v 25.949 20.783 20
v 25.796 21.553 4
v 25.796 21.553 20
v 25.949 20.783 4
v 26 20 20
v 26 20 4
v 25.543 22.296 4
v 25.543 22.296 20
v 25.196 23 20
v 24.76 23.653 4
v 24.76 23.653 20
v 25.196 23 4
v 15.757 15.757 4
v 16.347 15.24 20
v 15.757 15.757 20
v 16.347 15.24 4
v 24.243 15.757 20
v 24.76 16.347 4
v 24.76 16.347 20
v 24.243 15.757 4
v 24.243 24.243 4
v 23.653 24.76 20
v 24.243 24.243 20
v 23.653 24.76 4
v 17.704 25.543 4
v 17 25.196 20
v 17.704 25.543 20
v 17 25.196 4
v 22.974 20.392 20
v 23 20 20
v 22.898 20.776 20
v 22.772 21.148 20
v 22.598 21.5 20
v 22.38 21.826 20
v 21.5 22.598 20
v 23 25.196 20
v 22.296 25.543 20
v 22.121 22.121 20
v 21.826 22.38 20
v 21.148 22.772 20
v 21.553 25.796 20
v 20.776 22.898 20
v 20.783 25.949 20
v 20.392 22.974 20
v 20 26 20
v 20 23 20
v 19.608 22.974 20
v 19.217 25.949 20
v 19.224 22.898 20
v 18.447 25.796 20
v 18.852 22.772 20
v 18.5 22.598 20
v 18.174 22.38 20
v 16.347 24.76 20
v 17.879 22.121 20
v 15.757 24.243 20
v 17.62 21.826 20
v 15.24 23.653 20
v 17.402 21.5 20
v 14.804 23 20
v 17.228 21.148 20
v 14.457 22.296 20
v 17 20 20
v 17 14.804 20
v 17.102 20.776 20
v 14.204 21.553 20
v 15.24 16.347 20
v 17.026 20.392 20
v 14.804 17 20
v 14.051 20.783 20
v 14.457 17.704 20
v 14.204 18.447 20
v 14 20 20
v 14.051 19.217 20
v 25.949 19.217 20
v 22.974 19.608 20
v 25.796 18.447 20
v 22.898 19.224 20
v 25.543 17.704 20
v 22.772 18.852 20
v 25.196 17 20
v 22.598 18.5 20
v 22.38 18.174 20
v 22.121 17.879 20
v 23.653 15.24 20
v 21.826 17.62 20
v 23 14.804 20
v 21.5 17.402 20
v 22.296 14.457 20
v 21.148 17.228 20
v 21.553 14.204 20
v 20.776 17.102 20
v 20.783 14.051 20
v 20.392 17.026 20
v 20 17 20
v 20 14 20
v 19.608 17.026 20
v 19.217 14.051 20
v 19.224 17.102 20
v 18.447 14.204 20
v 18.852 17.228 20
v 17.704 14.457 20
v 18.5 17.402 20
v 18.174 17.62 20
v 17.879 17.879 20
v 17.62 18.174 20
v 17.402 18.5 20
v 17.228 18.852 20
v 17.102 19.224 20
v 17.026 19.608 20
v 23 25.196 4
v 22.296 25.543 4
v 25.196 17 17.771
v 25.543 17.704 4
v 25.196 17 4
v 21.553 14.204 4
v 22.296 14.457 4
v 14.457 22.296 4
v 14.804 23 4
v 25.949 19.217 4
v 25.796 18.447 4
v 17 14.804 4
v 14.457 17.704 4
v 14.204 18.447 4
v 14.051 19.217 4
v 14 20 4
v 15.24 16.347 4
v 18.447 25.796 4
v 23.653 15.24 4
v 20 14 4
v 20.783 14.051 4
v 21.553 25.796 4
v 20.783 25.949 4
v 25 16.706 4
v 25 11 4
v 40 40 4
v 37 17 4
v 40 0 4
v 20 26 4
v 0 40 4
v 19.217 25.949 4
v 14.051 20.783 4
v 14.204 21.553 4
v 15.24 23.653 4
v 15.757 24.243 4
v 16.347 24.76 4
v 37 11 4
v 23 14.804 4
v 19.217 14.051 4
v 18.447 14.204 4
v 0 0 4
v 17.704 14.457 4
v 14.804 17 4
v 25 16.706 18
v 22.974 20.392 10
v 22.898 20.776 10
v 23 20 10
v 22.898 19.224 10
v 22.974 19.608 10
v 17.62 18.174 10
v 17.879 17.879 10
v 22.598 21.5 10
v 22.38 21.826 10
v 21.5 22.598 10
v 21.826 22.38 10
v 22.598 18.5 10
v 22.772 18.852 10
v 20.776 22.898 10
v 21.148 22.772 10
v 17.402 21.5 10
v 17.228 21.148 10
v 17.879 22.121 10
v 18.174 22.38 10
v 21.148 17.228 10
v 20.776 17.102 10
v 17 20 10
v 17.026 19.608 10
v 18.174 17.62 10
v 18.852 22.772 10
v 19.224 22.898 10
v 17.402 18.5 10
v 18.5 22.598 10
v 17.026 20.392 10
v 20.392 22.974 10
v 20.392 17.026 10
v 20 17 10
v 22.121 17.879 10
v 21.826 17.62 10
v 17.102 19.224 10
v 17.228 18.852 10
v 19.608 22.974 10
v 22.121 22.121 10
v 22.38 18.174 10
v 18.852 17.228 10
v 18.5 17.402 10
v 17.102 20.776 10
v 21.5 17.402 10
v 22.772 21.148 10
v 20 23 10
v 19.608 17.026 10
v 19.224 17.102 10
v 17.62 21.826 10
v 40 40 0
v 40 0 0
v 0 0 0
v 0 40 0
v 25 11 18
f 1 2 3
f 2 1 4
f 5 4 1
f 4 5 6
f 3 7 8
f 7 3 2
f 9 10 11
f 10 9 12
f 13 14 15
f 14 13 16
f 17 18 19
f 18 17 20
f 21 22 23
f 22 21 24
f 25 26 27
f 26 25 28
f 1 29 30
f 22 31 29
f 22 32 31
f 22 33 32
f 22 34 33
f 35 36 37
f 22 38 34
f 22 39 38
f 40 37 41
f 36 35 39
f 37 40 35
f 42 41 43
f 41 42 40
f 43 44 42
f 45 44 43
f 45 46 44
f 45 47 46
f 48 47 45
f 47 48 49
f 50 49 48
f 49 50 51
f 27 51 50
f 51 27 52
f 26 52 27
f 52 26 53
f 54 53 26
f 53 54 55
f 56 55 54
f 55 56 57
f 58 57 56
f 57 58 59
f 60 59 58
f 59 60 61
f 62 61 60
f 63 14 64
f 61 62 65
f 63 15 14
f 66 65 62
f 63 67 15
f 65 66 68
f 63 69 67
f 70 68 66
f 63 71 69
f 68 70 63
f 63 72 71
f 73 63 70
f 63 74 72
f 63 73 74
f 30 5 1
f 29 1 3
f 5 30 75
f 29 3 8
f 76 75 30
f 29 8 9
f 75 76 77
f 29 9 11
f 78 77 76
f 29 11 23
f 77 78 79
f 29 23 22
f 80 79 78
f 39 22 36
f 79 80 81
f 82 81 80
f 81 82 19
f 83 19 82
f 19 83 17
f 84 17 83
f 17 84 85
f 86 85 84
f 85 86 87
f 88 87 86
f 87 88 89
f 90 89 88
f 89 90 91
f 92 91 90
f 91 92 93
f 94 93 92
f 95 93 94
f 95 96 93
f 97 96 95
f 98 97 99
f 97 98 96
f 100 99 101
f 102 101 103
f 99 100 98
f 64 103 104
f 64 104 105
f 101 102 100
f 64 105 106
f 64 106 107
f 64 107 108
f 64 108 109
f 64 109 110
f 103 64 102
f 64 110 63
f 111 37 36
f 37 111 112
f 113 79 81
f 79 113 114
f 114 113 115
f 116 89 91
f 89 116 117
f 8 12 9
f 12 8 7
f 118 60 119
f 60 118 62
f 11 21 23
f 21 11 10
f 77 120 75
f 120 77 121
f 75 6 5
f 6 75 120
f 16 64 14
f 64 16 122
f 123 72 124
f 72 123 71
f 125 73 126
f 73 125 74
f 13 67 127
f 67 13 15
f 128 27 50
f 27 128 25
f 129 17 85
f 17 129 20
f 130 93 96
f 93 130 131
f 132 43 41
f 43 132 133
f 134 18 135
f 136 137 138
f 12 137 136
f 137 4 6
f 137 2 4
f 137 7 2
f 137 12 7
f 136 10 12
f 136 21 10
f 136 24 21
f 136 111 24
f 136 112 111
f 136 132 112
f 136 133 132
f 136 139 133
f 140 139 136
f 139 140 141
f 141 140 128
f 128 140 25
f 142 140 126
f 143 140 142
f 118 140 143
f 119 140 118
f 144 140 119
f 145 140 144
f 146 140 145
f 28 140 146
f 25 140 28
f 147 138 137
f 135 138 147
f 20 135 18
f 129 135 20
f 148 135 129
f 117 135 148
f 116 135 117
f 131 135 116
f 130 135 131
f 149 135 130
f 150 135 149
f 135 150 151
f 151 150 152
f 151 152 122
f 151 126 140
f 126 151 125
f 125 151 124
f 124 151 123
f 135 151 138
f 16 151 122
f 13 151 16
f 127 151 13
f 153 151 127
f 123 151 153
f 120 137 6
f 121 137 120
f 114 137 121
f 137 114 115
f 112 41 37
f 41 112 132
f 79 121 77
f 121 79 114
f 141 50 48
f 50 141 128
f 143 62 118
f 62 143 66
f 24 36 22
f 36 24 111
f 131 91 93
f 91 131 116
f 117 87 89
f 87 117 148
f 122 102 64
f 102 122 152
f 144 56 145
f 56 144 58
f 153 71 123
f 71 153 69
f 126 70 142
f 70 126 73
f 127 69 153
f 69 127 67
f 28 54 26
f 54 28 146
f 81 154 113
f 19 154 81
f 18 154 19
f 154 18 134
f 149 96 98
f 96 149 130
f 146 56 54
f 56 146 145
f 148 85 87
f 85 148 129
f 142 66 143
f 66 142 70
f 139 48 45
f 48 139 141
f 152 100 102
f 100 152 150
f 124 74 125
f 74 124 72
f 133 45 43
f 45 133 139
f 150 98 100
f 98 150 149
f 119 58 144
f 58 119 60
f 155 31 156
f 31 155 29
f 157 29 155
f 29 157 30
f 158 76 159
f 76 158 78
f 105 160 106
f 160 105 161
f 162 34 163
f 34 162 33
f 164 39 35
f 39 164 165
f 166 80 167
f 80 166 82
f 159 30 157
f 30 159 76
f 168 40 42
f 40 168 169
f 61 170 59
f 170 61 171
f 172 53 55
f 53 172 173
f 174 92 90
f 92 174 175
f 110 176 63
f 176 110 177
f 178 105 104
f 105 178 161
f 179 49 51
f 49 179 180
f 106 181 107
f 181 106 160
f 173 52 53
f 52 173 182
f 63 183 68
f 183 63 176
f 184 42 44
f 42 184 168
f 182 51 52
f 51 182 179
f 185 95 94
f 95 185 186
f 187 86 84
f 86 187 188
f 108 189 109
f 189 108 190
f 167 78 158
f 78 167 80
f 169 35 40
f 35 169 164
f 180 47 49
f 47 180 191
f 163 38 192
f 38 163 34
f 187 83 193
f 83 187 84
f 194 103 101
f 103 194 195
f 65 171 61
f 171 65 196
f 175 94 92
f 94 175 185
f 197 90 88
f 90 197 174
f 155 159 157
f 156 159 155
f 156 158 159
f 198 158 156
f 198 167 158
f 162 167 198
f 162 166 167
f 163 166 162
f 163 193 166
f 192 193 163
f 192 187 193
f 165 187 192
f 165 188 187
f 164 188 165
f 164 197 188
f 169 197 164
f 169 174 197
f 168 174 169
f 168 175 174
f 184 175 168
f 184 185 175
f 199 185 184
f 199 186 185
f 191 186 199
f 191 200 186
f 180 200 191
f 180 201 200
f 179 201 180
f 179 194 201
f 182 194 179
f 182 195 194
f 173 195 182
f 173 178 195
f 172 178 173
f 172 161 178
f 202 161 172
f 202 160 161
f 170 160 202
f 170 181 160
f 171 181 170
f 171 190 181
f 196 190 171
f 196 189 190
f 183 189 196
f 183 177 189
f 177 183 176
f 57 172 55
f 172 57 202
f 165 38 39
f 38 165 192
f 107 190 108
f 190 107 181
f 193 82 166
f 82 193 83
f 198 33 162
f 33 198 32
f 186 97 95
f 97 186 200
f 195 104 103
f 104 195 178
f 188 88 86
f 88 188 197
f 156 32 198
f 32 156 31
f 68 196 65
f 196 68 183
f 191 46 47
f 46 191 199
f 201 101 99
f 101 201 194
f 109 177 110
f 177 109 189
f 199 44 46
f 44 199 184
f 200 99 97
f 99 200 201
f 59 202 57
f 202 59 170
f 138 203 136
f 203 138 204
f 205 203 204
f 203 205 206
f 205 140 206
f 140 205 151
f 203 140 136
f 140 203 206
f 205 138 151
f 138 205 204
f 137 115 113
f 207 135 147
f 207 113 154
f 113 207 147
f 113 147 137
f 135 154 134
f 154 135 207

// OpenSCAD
// Boss: a cylindrical post projecting from a floor with a bore for a
// fastener/insert, reinforced with a gusset (not freestanding) — the
// correct pattern from reference/strength-physics.md.
$fn = 48;
plate = 40; plate_h = 4;
bx = 20; by = 20; bh = 16; br = 6; bore_r = 3; bore_d = 10;
gh = 14; gl = 12; gthick = 6;

union() {
    // floor plate
    cube([plate, plate, plate_h]);
    // boss with blind bore
    translate([bx, by, plate_h])
    difference() {
        cylinder(h = bh, r = br);
        translate([0, 0, bh - bore_d]) cylinder(h = bore_d + 1, r = bore_r);
    }
    // gusset tying the boss back to the floor (overlaps boss slightly)
    translate([bx + br - 1, by - gthick / 2, 0])
    rotate([90, 0, 0])
    linear_extrude(height = gthick)
    polygon(points = [[0, plate_h], [0, plate_h + gh], [gl, plate_h]]);
}
